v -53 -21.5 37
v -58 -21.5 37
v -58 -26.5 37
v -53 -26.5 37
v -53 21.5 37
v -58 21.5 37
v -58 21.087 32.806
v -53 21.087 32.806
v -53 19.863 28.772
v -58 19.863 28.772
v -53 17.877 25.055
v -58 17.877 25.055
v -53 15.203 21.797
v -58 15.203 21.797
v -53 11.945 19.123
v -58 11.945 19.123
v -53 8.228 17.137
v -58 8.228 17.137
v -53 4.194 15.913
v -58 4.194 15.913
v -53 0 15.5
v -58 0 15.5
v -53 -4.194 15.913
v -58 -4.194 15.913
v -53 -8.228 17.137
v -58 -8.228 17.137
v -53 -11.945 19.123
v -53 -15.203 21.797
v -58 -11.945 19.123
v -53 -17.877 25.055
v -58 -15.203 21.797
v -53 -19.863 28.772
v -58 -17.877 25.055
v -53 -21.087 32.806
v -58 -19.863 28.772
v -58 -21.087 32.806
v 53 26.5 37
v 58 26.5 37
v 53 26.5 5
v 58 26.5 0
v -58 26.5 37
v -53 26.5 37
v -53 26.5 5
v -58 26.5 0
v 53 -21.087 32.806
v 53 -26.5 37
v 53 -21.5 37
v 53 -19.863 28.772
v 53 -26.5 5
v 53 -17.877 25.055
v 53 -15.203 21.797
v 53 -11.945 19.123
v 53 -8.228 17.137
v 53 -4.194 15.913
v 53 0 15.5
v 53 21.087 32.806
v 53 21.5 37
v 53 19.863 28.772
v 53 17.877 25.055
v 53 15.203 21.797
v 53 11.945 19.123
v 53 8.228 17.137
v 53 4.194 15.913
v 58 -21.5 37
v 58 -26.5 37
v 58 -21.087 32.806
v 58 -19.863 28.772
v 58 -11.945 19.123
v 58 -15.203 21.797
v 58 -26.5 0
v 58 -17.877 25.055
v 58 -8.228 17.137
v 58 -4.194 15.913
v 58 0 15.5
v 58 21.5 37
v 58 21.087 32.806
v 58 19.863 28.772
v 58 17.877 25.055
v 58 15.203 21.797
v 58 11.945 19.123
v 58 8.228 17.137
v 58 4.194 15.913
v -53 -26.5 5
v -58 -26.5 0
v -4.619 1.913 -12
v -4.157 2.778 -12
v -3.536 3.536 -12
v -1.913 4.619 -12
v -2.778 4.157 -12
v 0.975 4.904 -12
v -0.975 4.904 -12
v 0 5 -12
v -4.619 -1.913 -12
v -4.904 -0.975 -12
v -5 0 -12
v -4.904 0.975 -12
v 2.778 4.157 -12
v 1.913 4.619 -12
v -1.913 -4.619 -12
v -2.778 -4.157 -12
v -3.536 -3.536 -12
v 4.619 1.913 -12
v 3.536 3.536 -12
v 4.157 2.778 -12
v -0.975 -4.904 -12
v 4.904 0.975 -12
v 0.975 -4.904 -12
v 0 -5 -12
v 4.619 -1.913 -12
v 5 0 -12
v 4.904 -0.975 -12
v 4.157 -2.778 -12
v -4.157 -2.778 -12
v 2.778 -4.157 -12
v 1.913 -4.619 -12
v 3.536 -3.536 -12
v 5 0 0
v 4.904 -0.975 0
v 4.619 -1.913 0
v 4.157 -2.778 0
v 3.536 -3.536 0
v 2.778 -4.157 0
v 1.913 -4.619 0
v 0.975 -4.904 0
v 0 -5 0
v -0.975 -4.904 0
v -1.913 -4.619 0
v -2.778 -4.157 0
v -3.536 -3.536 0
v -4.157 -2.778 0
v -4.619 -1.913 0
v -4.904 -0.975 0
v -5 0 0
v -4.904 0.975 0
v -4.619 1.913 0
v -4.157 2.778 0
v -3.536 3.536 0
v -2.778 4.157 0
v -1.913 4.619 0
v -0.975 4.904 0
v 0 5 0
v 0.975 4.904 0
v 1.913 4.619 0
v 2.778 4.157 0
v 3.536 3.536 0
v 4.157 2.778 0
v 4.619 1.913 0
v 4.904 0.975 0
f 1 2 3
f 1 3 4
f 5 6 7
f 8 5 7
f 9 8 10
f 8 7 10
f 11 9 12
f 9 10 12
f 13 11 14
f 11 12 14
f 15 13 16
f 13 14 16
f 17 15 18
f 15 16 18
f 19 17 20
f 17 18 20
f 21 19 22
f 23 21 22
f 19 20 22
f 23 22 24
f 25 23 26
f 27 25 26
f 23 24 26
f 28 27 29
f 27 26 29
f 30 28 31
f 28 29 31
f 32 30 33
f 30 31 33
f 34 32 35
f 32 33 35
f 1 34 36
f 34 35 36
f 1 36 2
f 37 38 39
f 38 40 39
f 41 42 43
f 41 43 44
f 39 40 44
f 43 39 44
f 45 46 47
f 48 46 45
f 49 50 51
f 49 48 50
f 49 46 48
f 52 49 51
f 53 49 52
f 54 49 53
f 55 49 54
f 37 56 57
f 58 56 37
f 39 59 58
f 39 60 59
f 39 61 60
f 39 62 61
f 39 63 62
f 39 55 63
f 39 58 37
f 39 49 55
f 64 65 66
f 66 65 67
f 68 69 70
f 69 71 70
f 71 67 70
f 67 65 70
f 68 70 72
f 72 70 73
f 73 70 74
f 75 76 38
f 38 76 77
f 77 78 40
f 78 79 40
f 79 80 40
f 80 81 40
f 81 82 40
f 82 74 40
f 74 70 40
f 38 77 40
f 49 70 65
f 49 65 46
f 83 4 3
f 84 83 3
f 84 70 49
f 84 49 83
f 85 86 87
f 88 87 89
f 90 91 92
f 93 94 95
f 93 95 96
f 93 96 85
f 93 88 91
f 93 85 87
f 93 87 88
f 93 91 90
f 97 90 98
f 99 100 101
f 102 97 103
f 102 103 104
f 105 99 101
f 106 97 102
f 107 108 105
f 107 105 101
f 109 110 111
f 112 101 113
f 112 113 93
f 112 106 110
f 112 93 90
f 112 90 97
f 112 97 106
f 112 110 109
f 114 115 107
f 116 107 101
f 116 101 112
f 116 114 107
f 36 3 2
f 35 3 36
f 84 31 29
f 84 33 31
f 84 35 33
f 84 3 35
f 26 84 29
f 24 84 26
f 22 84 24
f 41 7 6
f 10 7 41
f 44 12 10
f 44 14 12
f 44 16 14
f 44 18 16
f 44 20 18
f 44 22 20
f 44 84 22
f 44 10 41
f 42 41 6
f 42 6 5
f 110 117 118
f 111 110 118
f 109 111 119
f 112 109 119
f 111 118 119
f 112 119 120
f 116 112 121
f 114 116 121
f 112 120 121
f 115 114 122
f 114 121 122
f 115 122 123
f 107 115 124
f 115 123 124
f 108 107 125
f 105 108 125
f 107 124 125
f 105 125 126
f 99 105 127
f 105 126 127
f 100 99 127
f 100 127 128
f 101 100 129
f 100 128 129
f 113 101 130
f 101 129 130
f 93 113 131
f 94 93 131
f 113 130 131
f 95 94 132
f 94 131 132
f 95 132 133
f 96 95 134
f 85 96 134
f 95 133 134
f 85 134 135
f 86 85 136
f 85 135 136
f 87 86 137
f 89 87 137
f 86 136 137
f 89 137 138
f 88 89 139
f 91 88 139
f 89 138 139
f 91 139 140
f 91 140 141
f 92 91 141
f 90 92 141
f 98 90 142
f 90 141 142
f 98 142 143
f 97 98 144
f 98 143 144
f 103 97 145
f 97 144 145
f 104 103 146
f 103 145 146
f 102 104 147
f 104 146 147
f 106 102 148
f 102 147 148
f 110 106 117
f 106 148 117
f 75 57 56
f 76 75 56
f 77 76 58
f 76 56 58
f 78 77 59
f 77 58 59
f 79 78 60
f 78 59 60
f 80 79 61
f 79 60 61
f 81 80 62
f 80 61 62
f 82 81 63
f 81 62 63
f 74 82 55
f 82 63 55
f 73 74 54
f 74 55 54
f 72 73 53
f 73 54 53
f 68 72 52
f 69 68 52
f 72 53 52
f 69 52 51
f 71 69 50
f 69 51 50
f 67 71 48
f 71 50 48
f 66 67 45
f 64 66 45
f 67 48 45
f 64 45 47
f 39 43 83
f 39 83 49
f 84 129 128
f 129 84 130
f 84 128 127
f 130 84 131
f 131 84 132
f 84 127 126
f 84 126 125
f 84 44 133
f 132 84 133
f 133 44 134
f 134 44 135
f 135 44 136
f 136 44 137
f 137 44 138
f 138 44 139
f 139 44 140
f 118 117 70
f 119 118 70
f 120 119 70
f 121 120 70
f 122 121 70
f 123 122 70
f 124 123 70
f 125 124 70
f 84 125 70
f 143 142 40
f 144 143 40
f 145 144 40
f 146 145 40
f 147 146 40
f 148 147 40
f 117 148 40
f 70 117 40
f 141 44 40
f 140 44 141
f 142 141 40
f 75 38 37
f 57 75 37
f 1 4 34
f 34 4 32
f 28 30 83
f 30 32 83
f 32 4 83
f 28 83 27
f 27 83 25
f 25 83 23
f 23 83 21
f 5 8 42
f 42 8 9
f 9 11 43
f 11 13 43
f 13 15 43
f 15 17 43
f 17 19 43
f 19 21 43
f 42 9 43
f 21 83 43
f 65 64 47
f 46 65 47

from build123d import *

# Parameters (mm, degrees)
SKETCH_1_W          = 116
SKETCH_1_H          = 53
EXTRUDE_1_DEPTH     = 5
SKETCH_2_W          = 5
SKETCH_2_H          = 53
EXTRUDE_2_DEPTH     = 32
SKETCH_3_R          = 21.5
CUT_EXTRUDE_1_DEPTH = 125.608386556
SKETCH_4_R          = 5
EXTRUDE_3_DEPTH     = 12


with BuildPart() as part:
    # 草图1 → 凸台-拉伸1 (new body)
    with BuildSketch(Plane.XY):
        Rectangle(SKETCH_1_W, SKETCH_1_H)
    extrude(amount=EXTRUDE_1_DEPTH)

    # 草图2 → 凸台-拉伸2 (add)
    with BuildSketch(Plane.XY.offset(5)):
        with Locations((-55.5, 0)):
            Rectangle(SKETCH_2_W, SKETCH_2_H)
    extrude_2 = extrude(amount=EXTRUDE_2_DEPTH)

    # 镜向1: 凸台-拉伸2 across plane
    add(extrude_2.mirror(Plane(origin=(0, 0, 0), x_dir=(0, 0, 1), z_dir=(1, 0, 0))))

    # 草图3 → 切除-拉伸1 (cut, through all)
    with BuildSketch(Plane.ZY.offset(58)):
        with Locations((37, 0)):
            Circle(SKETCH_3_R)
    extrude(amount=-CUT_EXTRUDE_1_DEPTH, mode=Mode.SUBTRACT)

    # 草图4 → 凸台-拉伸3 (add)
    with BuildSketch(Plane(origin=(0, 0, 0), x_dir=(-1, 0, 0), z_dir=(0, 0, -1))):
        with Locations(Location((0, 0, 0), (0, 0, 180))):
            Circle(SKETCH_4_R)
    extrude(amount=EXTRUDE_3_DEPTH)


solid = part.part
